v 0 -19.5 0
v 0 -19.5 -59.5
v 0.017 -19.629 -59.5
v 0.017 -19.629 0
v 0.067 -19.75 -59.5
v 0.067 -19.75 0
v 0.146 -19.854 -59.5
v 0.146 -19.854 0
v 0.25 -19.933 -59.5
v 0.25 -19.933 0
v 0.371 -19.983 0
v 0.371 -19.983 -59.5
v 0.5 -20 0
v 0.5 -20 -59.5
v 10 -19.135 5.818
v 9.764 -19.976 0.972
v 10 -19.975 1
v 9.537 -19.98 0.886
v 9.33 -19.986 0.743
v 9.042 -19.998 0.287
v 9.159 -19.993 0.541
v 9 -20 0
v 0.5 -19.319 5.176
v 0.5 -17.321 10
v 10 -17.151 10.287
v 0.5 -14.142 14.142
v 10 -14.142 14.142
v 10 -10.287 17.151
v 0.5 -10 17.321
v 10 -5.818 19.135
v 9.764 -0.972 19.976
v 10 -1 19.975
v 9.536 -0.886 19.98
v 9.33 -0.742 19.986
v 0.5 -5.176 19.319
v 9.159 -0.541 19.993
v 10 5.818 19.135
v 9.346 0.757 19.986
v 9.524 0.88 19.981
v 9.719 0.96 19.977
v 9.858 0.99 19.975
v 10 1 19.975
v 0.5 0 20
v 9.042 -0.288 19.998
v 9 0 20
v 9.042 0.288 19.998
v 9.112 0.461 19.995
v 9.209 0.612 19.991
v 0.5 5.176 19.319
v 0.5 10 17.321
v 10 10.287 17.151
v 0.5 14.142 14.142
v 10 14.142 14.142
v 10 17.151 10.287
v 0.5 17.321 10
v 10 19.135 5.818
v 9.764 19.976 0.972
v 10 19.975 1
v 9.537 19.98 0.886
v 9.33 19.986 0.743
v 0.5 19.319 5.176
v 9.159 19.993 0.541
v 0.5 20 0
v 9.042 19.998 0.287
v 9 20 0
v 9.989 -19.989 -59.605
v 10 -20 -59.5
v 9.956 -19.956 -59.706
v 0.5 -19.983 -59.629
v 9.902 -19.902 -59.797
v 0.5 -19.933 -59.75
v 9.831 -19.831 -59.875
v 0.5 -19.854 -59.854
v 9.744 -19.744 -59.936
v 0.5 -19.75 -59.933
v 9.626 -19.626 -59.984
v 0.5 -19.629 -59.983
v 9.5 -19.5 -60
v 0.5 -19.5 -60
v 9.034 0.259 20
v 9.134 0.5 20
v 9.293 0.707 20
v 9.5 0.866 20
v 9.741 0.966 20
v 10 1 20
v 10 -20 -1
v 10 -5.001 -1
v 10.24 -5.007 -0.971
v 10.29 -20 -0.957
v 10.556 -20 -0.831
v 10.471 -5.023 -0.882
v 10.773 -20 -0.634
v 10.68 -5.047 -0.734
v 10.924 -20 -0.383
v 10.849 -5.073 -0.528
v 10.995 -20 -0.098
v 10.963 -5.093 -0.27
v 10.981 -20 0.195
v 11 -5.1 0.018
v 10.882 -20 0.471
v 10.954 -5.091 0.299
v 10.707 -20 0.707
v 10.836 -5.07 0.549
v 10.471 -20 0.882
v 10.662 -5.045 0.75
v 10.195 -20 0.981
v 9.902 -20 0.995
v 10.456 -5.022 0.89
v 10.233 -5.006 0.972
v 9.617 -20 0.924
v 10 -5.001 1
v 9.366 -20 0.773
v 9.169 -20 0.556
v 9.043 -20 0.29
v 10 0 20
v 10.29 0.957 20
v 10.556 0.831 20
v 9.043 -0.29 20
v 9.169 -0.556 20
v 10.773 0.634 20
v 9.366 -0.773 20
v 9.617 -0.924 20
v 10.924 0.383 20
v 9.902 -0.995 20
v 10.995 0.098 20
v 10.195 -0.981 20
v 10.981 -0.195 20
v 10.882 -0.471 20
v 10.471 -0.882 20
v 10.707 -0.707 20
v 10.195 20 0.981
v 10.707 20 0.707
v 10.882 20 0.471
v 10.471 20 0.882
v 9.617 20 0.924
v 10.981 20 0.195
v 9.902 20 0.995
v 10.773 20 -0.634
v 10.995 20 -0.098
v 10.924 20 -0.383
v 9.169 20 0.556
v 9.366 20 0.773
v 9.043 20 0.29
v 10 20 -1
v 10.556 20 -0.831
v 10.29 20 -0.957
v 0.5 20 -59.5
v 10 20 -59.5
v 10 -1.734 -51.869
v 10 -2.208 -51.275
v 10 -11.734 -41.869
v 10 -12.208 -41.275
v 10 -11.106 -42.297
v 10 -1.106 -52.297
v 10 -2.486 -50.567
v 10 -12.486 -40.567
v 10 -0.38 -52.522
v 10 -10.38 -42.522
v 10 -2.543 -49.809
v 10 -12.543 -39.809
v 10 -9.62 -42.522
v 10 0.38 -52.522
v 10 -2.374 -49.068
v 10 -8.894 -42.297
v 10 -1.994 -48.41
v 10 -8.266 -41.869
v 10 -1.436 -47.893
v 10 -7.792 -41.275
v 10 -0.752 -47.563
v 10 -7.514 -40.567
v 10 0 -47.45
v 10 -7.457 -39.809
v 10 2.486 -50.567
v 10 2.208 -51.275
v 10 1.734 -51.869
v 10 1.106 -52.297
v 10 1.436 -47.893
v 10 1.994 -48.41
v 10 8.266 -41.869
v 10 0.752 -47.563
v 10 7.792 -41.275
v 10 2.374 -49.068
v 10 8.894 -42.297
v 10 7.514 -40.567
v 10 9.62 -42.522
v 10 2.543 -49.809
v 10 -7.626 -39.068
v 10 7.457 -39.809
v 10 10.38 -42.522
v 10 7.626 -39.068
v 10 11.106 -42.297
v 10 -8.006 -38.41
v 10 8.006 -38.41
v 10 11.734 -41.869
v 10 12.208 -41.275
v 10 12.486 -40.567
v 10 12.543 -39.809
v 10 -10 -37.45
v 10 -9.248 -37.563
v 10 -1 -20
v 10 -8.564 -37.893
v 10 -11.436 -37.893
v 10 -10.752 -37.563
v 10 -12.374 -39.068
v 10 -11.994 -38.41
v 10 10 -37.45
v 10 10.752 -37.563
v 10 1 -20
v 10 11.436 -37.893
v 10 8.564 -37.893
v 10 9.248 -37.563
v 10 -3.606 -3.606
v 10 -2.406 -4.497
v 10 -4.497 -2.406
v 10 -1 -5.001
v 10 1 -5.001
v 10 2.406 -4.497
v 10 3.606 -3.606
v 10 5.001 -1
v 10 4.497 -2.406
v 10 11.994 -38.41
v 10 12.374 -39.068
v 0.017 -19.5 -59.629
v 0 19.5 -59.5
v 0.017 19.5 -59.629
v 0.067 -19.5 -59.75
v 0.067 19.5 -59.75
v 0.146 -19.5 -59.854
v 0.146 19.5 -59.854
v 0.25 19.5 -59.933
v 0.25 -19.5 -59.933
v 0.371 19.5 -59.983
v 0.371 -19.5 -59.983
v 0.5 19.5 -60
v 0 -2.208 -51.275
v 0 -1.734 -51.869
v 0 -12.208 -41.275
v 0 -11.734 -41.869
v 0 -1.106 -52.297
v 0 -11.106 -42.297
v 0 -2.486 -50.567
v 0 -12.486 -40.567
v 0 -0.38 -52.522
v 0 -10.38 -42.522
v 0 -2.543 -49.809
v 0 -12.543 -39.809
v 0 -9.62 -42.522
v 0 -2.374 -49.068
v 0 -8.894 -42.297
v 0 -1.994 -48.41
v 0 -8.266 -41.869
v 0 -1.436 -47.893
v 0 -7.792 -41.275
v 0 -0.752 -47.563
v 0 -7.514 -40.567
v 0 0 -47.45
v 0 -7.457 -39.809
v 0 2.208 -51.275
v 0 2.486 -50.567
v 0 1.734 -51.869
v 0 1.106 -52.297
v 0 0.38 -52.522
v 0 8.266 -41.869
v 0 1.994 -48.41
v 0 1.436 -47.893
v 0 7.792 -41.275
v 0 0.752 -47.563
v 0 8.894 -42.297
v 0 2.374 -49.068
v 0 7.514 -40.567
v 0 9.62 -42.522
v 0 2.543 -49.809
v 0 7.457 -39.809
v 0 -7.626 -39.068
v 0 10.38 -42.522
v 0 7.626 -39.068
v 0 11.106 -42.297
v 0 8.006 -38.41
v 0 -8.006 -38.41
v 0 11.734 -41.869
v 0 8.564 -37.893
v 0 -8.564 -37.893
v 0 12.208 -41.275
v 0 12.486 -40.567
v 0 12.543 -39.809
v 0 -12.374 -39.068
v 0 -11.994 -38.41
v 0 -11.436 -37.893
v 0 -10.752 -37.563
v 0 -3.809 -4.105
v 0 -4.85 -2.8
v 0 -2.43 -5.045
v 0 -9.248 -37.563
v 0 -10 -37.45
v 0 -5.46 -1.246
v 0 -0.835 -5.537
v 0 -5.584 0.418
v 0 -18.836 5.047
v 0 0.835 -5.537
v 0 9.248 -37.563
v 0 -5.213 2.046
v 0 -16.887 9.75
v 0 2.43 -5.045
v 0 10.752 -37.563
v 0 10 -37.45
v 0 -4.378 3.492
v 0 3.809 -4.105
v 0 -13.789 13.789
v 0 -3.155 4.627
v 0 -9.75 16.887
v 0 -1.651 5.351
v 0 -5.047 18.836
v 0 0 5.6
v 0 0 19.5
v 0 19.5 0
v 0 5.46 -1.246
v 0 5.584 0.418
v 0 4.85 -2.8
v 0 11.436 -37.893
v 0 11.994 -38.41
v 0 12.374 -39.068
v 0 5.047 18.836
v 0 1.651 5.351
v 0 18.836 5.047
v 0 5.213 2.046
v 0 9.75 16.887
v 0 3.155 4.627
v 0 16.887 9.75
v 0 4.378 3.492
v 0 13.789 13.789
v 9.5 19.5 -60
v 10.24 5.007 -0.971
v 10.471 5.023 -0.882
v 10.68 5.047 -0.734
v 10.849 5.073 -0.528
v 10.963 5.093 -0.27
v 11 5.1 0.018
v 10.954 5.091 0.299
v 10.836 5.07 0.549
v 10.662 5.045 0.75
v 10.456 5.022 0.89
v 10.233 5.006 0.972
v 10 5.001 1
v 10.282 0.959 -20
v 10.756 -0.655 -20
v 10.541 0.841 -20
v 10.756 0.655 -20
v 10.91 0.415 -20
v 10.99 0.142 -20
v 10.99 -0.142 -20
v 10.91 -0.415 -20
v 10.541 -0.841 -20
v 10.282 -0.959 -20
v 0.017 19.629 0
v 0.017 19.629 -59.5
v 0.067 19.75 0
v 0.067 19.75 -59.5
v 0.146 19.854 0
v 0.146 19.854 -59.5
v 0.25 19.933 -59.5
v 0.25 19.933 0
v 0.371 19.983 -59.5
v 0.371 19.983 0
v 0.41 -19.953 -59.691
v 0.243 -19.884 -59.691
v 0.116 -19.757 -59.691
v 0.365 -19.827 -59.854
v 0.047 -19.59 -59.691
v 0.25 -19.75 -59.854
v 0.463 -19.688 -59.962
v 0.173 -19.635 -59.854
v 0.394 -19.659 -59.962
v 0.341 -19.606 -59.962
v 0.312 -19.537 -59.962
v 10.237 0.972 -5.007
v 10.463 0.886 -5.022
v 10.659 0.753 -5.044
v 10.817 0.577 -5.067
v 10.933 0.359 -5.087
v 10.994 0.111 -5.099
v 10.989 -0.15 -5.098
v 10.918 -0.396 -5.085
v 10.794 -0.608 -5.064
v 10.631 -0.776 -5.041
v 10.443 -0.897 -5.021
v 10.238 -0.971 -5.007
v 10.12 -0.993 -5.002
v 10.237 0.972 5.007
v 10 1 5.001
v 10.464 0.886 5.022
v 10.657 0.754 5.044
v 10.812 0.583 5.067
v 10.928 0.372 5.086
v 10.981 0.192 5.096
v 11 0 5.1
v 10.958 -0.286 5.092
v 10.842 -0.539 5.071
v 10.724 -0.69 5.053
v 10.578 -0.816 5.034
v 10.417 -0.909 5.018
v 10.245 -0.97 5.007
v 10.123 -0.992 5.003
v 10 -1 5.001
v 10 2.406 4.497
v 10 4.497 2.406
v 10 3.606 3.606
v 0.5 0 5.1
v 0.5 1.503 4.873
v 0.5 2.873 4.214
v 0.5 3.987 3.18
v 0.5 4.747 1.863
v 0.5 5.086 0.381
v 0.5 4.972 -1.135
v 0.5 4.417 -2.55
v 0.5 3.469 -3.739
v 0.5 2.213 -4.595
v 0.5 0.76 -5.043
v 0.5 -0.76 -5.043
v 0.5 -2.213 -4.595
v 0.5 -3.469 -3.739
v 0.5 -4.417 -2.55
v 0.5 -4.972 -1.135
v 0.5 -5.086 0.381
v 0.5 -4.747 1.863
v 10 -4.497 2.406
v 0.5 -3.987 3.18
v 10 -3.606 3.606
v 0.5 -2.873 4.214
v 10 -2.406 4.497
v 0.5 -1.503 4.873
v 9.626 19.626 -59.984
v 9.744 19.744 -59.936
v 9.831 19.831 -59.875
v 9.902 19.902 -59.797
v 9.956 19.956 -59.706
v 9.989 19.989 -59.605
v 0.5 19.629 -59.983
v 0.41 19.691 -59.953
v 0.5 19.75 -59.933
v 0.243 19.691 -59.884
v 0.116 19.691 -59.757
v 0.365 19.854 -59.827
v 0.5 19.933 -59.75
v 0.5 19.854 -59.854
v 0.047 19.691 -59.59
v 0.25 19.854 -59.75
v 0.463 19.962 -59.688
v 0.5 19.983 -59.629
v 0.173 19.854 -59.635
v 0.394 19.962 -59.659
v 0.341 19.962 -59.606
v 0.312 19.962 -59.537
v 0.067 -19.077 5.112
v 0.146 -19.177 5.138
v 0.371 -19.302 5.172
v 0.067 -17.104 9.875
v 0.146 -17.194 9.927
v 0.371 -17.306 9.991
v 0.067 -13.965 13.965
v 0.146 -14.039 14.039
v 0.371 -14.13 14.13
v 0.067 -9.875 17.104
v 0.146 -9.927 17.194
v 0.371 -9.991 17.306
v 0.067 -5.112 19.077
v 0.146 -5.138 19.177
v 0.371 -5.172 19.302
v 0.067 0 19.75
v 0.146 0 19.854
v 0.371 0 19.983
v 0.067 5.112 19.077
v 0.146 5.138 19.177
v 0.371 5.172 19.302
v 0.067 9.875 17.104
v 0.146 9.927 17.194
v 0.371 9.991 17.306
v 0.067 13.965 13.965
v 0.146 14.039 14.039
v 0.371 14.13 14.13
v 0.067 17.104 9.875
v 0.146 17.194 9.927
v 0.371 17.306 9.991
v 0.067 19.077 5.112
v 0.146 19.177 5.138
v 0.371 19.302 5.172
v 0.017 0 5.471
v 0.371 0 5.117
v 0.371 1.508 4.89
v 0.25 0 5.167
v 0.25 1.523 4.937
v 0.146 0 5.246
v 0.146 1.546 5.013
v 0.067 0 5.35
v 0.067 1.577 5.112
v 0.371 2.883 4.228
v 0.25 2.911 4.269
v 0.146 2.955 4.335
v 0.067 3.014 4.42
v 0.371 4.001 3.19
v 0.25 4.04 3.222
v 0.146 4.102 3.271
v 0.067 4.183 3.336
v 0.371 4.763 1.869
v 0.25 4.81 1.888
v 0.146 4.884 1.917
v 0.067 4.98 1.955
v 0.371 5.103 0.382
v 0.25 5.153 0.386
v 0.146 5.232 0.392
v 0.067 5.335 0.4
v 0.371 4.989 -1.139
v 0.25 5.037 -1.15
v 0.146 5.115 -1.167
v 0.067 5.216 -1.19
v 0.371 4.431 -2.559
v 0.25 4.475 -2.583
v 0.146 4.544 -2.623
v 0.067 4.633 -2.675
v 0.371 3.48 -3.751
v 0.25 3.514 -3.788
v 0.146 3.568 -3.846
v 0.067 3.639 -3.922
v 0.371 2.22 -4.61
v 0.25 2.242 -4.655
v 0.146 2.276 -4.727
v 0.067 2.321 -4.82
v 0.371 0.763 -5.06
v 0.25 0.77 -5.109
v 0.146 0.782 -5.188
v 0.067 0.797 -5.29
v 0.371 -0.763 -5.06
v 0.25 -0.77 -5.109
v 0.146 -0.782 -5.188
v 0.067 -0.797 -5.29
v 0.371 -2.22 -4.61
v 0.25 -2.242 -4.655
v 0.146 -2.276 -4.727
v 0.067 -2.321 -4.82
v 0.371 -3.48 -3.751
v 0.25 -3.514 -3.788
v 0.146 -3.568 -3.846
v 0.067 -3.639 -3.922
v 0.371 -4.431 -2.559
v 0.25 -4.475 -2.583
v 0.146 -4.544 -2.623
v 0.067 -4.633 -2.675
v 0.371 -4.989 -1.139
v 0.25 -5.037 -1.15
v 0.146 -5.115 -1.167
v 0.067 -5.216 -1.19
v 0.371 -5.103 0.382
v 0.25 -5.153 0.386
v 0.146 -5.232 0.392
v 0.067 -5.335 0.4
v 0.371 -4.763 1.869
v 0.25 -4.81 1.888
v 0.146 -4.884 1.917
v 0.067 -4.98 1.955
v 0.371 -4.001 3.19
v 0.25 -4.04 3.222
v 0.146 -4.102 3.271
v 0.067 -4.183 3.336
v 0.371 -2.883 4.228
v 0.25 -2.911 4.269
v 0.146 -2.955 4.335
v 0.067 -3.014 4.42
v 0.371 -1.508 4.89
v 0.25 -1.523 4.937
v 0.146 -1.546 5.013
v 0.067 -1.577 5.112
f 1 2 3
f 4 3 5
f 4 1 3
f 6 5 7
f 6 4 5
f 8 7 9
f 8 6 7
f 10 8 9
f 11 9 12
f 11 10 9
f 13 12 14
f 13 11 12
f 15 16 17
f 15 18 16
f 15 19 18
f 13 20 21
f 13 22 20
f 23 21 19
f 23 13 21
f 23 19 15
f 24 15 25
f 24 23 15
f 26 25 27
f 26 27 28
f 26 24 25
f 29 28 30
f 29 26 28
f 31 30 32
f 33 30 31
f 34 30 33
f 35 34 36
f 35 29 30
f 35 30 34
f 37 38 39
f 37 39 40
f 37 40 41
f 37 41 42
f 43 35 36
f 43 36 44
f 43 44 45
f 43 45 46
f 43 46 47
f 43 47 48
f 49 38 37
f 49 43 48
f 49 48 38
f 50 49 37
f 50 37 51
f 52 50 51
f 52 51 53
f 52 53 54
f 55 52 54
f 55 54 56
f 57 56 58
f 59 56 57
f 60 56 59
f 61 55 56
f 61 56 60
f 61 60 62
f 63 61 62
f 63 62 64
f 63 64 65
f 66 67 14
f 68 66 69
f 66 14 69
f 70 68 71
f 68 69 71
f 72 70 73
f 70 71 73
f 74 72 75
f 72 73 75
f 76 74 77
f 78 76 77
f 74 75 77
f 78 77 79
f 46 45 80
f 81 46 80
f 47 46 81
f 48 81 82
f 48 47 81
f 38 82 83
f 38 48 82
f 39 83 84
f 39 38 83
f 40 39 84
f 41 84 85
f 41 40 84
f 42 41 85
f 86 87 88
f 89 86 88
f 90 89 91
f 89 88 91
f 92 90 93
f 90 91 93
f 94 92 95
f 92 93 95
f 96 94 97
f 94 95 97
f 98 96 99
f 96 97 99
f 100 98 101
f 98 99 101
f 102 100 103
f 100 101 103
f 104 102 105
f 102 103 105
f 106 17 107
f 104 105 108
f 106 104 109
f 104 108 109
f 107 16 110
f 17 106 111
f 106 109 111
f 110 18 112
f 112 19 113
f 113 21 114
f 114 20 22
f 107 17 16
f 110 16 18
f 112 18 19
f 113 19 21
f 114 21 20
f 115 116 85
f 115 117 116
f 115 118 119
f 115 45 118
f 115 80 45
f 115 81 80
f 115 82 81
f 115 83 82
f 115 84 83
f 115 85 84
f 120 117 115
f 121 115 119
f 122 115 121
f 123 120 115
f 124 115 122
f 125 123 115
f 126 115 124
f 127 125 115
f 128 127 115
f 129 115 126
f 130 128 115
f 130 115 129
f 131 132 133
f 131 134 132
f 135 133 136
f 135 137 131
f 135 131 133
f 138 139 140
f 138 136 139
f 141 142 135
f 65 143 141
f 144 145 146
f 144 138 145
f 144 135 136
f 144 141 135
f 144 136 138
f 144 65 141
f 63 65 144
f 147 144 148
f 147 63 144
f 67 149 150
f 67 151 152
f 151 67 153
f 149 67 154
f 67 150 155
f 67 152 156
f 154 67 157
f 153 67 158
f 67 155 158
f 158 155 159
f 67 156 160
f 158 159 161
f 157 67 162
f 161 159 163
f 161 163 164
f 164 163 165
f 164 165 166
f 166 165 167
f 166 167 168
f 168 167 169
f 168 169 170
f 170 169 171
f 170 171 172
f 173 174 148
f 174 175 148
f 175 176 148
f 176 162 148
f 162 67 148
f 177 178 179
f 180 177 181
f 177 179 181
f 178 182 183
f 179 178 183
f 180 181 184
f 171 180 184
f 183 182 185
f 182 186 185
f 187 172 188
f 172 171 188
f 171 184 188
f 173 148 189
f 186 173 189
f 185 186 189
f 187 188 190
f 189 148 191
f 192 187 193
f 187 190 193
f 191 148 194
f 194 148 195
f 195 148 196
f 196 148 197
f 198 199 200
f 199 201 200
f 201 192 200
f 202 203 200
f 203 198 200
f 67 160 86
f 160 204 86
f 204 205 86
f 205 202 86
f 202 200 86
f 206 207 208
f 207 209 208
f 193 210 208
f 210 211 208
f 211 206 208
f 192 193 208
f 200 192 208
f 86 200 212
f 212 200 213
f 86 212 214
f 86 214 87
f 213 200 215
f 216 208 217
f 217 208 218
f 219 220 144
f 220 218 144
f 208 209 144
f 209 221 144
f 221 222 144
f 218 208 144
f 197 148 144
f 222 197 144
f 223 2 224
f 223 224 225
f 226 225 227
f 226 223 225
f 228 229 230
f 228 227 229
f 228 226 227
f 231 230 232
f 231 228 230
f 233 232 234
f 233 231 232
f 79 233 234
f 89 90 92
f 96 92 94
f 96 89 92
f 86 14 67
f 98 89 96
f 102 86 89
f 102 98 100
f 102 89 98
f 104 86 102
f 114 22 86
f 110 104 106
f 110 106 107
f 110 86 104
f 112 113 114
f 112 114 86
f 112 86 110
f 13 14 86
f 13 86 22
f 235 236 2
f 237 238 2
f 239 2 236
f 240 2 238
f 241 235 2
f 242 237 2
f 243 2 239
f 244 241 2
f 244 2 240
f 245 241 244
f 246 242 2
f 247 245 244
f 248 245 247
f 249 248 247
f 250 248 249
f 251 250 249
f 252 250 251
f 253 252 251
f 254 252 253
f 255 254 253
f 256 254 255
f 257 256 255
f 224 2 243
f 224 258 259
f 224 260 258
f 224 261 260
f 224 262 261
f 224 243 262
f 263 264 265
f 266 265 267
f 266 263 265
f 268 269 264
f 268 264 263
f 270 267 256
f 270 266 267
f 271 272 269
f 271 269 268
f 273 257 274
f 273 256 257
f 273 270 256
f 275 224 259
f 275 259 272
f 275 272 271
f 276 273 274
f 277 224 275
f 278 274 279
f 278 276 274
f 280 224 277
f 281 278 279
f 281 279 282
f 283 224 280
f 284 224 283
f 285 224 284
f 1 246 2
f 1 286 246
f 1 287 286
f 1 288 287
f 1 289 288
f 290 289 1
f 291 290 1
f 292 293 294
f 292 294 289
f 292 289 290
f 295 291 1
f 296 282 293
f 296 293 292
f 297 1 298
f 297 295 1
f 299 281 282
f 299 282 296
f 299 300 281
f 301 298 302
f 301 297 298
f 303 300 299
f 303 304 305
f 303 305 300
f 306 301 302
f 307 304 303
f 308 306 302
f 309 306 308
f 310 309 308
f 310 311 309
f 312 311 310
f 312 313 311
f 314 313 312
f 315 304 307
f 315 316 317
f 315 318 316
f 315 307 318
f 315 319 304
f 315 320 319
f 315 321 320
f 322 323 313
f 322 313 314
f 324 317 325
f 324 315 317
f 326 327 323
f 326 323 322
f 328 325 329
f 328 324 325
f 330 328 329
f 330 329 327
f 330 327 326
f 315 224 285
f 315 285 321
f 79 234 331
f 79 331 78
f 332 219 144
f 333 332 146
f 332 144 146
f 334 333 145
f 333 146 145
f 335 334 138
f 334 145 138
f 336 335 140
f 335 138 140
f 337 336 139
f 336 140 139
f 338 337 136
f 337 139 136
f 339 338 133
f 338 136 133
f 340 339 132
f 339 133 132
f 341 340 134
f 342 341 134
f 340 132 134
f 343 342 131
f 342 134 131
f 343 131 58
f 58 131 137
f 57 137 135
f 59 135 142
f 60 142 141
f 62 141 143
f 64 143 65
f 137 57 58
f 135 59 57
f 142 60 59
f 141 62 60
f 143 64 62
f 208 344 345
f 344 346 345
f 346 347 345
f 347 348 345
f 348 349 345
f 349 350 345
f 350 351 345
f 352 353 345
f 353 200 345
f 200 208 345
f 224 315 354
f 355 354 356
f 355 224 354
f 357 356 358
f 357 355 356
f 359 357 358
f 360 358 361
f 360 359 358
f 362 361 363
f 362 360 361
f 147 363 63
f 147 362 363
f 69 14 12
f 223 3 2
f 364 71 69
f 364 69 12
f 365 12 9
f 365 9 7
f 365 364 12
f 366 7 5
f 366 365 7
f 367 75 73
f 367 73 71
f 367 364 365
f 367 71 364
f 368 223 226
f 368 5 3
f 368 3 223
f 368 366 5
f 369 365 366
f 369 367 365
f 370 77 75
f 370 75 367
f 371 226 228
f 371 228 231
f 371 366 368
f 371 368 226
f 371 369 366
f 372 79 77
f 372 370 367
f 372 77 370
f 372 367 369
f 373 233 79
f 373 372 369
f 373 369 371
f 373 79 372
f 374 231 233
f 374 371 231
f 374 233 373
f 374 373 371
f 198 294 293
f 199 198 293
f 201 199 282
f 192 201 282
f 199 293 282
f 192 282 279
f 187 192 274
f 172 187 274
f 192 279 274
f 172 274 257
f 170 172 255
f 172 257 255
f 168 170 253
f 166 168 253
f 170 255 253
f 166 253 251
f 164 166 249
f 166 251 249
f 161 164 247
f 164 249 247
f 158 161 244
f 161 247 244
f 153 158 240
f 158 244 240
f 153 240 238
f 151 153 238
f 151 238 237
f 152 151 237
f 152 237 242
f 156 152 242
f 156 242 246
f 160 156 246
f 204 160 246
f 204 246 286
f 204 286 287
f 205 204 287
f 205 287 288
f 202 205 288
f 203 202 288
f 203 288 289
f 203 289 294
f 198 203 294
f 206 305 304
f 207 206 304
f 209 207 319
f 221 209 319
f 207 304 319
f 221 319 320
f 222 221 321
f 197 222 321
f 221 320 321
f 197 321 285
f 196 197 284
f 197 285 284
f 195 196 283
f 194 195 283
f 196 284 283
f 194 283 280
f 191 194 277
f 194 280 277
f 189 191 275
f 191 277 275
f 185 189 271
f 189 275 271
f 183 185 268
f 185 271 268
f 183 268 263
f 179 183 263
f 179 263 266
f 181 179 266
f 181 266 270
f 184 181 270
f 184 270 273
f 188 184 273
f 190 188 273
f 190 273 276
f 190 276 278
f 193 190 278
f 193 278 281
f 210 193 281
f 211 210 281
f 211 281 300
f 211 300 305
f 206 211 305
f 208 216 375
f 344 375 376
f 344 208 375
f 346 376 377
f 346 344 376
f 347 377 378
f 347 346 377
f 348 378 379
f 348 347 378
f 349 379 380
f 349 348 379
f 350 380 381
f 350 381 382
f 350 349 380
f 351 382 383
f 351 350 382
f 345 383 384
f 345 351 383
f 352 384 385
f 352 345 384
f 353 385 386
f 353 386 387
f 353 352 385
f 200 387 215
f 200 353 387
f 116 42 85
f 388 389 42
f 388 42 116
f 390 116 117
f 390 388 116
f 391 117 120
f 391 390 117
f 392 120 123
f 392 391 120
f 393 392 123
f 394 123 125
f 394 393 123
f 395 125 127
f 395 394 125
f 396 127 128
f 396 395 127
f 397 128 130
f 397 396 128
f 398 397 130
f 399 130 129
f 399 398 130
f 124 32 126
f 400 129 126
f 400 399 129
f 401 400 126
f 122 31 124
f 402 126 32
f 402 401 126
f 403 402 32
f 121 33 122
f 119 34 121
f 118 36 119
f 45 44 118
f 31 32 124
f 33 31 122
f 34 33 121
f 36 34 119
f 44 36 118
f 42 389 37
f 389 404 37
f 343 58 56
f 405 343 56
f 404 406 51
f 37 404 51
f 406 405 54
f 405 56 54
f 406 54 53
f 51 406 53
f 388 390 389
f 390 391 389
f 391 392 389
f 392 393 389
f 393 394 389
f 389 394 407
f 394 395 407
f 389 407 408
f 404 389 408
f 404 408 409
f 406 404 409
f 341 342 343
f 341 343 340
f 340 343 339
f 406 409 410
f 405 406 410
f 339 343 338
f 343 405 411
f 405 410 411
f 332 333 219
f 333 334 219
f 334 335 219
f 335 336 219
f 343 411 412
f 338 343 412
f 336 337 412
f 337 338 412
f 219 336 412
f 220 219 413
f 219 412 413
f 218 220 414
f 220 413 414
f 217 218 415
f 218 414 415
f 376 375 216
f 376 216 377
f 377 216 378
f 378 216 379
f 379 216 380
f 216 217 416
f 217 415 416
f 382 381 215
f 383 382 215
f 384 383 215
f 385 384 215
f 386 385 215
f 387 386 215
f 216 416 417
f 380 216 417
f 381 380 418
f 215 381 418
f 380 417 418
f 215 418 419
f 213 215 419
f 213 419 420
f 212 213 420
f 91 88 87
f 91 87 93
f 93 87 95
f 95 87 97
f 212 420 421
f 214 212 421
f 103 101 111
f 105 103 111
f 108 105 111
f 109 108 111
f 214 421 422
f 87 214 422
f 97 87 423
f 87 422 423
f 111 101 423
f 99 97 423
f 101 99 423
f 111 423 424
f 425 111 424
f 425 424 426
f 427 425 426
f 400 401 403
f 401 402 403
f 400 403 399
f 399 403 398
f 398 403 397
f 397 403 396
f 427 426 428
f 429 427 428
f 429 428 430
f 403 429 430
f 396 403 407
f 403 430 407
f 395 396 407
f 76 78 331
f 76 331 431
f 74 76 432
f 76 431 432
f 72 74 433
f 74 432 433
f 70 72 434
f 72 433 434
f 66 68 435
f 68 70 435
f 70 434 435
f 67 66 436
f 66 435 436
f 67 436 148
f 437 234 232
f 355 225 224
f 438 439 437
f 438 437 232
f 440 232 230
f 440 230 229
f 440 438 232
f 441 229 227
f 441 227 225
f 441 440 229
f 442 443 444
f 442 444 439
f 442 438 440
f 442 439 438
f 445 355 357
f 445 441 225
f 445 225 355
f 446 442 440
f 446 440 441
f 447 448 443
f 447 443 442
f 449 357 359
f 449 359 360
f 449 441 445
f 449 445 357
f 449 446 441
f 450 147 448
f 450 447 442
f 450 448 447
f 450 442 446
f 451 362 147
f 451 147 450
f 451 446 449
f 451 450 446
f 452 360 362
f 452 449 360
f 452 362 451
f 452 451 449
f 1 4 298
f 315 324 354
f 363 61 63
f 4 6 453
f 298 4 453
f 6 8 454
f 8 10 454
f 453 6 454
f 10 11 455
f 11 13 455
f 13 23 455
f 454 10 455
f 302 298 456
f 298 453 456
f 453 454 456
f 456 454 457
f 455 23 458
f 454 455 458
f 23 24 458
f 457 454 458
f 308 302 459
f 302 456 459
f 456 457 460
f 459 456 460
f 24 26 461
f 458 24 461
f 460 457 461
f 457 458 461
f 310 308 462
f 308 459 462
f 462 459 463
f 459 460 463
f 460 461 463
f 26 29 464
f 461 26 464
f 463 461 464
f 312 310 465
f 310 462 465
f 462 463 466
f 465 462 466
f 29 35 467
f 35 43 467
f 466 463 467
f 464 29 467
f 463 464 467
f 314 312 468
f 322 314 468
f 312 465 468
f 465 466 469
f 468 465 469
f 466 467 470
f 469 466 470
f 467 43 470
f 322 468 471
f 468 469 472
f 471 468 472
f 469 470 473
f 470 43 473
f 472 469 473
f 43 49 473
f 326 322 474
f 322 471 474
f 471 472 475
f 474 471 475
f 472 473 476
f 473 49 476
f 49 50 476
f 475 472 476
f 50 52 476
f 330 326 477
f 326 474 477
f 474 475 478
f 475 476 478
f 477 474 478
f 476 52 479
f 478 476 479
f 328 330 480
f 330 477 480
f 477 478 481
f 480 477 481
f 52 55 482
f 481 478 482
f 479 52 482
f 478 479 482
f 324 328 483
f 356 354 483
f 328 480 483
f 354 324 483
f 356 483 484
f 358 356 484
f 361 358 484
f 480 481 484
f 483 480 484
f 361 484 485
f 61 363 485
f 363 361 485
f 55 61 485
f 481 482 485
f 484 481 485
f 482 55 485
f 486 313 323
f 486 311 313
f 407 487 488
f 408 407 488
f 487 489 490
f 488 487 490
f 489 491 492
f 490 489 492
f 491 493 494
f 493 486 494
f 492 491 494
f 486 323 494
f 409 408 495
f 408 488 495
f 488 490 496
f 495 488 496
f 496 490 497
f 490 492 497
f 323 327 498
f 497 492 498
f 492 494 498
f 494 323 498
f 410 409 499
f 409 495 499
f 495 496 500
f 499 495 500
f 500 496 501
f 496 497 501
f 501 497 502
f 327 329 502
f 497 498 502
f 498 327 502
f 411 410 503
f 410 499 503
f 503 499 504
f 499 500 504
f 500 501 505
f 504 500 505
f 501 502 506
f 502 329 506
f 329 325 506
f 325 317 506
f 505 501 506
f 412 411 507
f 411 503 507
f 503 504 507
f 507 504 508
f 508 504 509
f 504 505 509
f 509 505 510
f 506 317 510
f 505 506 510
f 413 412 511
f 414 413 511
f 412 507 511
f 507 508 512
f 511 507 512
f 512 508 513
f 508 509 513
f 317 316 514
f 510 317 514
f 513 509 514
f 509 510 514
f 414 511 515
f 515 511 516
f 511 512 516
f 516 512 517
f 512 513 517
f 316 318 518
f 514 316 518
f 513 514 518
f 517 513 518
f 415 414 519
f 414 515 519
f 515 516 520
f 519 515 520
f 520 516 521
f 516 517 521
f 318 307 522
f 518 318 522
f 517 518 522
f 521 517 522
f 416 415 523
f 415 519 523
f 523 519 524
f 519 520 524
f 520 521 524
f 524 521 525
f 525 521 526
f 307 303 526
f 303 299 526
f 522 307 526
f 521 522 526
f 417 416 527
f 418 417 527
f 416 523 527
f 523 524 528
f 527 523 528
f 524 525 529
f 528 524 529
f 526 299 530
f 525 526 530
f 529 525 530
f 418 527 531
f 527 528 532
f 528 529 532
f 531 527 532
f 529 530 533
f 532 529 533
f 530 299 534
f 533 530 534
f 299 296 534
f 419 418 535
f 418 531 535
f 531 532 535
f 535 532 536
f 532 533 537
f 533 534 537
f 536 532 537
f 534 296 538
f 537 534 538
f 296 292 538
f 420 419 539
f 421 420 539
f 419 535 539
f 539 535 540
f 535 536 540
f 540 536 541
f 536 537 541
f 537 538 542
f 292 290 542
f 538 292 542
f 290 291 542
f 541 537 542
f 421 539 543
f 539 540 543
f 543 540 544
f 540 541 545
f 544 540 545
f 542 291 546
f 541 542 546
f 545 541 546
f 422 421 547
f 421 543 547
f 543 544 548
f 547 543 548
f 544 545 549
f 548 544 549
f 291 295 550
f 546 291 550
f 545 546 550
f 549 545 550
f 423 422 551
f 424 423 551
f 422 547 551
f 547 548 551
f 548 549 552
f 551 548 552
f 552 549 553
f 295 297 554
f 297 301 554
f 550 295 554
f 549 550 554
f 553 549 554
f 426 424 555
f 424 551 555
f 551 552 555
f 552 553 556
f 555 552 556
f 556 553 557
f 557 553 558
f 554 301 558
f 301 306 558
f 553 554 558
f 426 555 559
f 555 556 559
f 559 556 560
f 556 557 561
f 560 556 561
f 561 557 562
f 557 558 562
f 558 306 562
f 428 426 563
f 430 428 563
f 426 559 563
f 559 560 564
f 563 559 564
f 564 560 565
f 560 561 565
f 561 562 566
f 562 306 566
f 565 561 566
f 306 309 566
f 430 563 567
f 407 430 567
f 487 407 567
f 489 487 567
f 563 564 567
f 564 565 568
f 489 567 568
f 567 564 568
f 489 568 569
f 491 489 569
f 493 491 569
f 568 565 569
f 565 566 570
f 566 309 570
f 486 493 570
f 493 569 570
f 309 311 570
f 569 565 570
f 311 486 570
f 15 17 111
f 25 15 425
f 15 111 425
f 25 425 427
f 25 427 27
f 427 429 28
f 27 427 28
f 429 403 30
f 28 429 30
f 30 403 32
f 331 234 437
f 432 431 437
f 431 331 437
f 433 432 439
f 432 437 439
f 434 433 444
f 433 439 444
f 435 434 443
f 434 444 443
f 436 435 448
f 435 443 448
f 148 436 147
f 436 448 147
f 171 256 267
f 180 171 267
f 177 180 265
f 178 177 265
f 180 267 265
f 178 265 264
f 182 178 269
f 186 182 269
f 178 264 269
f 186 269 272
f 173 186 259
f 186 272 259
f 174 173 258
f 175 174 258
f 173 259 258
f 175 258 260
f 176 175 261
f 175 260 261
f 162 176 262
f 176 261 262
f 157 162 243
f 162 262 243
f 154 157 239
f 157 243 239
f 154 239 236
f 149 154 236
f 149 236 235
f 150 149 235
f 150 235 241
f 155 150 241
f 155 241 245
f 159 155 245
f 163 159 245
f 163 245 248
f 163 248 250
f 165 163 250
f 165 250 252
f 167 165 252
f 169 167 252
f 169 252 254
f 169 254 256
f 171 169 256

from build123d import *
from build123d.topology import SkipClean

# Parameters (mm, degrees)
BOSS_EXTRUDE1_DEPTH = 10
SKETCH3_W           = 1
SKETCH3_H           = 40
SKETCH4_W           = 40
SKETCH4_H           = 1
SKETCH7_R           = 5.1
CUT_EXTRUDE3_DEPTH  = 65.195015431
FILLET3_R           = 0.5
FILLET4_R           = 0.5
SKETCH6_R           = 2.55
CUT_EXTRUDE4_DEPTH  = 65.195015432


with BuildPart() as part:
    # Sketch1 → Boss-Extrude1 (new body)
    with BuildSketch(Plane(origin=(0, 0, 0), x_dir=(0, 0, -1), z_dir=(1, 0, 0))):
        with BuildLine():
            Line((0, 20), (60, 20))
            Line((60, 20), (60, -20))
            Line((60, -20), (0, -20))
            ThreePointArc((0, -20), (-20, 0), (0, 20))
        make_face()
    extrude(amount=BOSS_EXTRUDE1_DEPTH)

    # Sketch3 → Revolve-Thin1 (revolve)
    with BuildSketch(Plane(origin=(10, 0, 0), x_dir=(0, 0, -1), z_dir=(1, 0, 0))):
        with Locations((0.5, 0)):
            Rectangle(SKETCH3_W, SKETCH3_H)
    revolve(axis=Axis((10, 20, 0), (0, -1, 0)))

    # Sketch4 → Revolve-Thin2 (revolve)
    with SkipClean():  # the faces are left unmerged after this step: merging them gives an invalid solid
        with BuildSketch(Plane(origin=(10, 0, 0), x_dir=(0, 0, -1), z_dir=(1, 0, 0))):
            with Locations((0, 0.5)):
                Rectangle(SKETCH4_W, SKETCH4_H)
        revolve(axis=Axis((10, 0, 20), (0, 0, -1)))

    # Sketch7 → Cut-Extrude3 (cut, through all)
    with SkipClean():  # the faces are left unmerged after this step: merging them gives an invalid solid
        with BuildSketch(Plane.ZY):
            Circle(SKETCH7_R)
        extrude(amount=-CUT_EXTRUDE3_DEPTH, mode=Mode.SUBTRACT)

    # Fillet3
    fillet3_edges = [part.edges().sort_by_distance(p)[0] for p in [
        (0, 20, -30),
        (0, 0, -60),
        (0, -20, -30),
        (0, 0, -5.1),
        (0, 0, 20),
    ]]
    fillet(fillet3_edges, radius=FILLET3_R)

    # Fillet4
    # the kernel refuses this fillet: 0.5 mm, written as the material it takes off along each edge
    with BuildSketch(Plane(origin=(0.5, 19.5, -59.5), x_dir=(0, 0, -1), z_dir=(0, 1, 0))) as fillet4_piece_1_section:
        Polygon((0, 0), (FILLET4_R, 0), (FILLET4_R, FILLET4_R), (0, FILLET4_R), align=None)
    fillet4_piece_1 = extrude(amount=FILLET4_R, mode=Mode.PRIVATE)
    fillet4_piece_1 = fillet4_piece_1 - Plane(origin=(0.5, 19.5, -59.5), x_dir=(0.7071067811865475, 0, 0.7071067811865475), z_dir=(0, 1, 0)) * Sphere(FILLET4_R, mode=Mode.PRIVATE)
    add(fillet4_piece_1, mode=Mode.SUBTRACT)
    with BuildSketch(Plane(origin=(0.5, -19.5, -59.5), x_dir=(0, -1, 0), z_dir=(0, 0, -1))) as fillet4_piece_2_section:
        Polygon((0, 0), (FILLET4_R, 0), (FILLET4_R, FILLET4_R), (0, FILLET4_R), align=None)
    fillet4_piece_2 = extrude(amount=FILLET4_R, mode=Mode.PRIVATE)
    fillet4_piece_2 = fillet4_piece_2 - Plane(origin=(0.5, -19.5, -59.5), x_dir=(0.7071067811865475, 0.7071067811865475, 0), z_dir=(0, 0, -1)) * Sphere(FILLET4_R, mode=Mode.PRIVATE)
    add(fillet4_piece_2, mode=Mode.SUBTRACT)
    with BuildSketch(Plane(origin=(10, 21.25, -60), x_dir=(-1, 0, 0), z_dir=(0, -1, 0))) as fillet4_piece_3:
        with BuildLine():
            CenterArc((FILLET4_R, -FILLET4_R), FILLET4_R, 90, 90)
            Line((0, -FILLET4_R), (0, 0))
            Line((0, 0), (FILLET4_R, 0))
        make_face()
    extrude(amount=42.5, mode=Mode.SUBTRACT)
    with BuildSketch(Plane(origin=(0.5, 20, -60), x_dir=(0, 0, 1), z_dir=(1, 0, 0)), Plane(origin=(0.5, -20, -60), x_dir=(0, 1, 0), z_dir=(1, 0, 0))) as fillet4_piece_4:
        with BuildLine():
            CenterArc((FILLET4_R, FILLET4_R), FILLET4_R, 180, 90)
            Line((0, FILLET4_R), (0, 0))
            Line((0, 0), (FILLET4_R, 0))
        make_face()
    extrude(amount=10.75, mode=Mode.SUBTRACT)

    # Sketch6 → Cut-Extrude4 (cut, through all)
    with SkipClean():  # the faces are left unmerged after this step: merging them gives an invalid solid
        with BuildSketch(Plane.ZY):
            with Locations((-40, 10)):
                Circle(SKETCH6_R)
            with Locations((-50, 0)):
                Circle(SKETCH6_R)
            with Locations((-40, -10)):
                Circle(SKETCH6_R)
        extrude(amount=-CUT_EXTRUDE4_DEPTH, mode=Mode.SUBTRACT)


solid = part.part
